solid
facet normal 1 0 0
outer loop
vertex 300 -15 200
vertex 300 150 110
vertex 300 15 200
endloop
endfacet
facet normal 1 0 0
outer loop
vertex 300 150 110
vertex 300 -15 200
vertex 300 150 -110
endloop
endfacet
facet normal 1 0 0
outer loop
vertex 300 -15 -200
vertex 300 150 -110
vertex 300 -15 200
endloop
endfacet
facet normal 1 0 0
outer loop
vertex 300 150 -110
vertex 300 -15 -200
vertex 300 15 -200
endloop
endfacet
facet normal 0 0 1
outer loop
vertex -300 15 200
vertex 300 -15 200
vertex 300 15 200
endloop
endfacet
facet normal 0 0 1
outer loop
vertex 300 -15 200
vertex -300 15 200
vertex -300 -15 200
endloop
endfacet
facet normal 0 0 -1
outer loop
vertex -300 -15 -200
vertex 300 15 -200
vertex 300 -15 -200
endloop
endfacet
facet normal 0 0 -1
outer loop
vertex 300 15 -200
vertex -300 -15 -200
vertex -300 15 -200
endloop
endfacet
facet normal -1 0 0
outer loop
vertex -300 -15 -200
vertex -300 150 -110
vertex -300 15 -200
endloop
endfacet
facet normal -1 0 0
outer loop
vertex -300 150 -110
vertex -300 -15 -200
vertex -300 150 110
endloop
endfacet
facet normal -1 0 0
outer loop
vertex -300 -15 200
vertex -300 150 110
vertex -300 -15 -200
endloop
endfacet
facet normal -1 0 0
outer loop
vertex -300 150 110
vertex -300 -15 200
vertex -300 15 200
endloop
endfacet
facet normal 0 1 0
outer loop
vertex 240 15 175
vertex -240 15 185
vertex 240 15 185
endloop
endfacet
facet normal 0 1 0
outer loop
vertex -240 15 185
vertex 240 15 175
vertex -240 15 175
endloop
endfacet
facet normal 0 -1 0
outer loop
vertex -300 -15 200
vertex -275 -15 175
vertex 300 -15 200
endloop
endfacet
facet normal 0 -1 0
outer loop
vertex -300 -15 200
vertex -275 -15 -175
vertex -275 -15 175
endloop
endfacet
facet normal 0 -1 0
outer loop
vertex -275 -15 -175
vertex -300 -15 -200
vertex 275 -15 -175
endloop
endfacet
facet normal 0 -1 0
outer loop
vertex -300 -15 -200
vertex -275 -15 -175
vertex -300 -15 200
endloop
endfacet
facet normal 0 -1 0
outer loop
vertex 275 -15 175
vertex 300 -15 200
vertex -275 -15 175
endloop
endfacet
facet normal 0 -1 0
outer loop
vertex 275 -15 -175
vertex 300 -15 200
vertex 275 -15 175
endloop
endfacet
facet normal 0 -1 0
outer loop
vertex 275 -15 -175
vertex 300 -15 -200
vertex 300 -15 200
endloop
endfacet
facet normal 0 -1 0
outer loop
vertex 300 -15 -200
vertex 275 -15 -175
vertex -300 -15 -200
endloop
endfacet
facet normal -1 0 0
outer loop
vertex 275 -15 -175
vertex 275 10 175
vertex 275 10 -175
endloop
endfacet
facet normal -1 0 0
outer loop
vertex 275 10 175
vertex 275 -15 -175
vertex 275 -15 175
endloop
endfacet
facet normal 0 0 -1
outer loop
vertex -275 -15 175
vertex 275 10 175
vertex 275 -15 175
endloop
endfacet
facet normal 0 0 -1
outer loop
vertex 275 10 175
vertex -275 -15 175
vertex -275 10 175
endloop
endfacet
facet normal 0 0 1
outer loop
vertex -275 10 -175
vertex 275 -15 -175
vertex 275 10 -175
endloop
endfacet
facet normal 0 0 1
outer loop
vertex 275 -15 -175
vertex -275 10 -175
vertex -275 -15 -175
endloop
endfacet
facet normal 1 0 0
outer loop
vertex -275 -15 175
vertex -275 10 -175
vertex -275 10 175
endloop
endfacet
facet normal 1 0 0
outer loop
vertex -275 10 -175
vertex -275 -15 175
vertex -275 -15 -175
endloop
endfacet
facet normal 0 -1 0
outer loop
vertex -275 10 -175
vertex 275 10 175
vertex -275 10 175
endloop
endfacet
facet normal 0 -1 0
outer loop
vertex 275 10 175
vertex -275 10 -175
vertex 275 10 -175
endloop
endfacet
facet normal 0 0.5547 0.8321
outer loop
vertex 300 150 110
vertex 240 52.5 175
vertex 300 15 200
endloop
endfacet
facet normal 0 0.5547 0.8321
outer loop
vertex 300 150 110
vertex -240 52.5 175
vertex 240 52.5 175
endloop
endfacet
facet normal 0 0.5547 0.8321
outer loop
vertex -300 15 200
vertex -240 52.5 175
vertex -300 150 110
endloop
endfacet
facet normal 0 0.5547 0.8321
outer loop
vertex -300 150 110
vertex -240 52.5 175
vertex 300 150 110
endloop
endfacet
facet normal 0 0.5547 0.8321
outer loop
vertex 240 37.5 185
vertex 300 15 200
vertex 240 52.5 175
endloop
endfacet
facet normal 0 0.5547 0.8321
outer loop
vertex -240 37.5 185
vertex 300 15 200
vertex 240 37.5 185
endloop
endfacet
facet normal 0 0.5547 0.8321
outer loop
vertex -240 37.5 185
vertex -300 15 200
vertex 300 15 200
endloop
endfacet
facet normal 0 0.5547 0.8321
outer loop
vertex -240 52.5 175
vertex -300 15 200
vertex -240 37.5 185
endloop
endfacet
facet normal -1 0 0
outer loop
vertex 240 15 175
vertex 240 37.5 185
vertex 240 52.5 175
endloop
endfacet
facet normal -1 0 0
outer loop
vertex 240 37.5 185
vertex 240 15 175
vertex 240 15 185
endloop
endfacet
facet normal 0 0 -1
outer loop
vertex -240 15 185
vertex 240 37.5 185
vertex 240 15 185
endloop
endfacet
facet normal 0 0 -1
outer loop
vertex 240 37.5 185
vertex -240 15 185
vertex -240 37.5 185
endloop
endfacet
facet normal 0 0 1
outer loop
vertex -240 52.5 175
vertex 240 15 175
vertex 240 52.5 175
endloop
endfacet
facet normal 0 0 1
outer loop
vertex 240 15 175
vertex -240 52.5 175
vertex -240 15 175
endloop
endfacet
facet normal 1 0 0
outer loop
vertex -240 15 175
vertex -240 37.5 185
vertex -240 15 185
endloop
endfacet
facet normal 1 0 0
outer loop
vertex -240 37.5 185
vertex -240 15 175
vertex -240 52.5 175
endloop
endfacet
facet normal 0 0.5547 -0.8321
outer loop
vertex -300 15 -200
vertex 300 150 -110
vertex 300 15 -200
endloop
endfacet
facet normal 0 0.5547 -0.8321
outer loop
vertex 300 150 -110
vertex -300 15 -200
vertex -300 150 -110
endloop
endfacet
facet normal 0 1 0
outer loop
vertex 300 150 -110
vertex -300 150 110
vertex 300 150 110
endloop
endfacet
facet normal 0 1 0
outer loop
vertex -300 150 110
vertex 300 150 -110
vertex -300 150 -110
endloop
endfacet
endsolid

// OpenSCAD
body = [600,30,400];
body_screen_offset = [50,-50,50];
body_angle = 30; // USE!!
hole = [body.x*0.8,300,10];

color("silver")
monitor();

module monitor() {
  body();
  difference() {
    union() {
      ramp();
      difference() {
        mirror([0,0,1]) ramp();
        translate([0, body.y/2, body.z/2 * 0.9])
          cube(hole, center = true);
      }
    }
    translate([0,500,0]) cube(700,center=true);
  }
}

module body() {
  difference() {
    cube(body, center = true);
    translate([0,-body.y,0])
      cube(body-body_screen_offset , center=true);
  }
}

module ramp() {
  points = [[0,body.x/2],[0,0],[body.z/2,0]];
  translate([-body.x/2,body.y/2,0])
    rotate([0,90,0])
    linear_extrude(body.x)
    polygon(points);
}
